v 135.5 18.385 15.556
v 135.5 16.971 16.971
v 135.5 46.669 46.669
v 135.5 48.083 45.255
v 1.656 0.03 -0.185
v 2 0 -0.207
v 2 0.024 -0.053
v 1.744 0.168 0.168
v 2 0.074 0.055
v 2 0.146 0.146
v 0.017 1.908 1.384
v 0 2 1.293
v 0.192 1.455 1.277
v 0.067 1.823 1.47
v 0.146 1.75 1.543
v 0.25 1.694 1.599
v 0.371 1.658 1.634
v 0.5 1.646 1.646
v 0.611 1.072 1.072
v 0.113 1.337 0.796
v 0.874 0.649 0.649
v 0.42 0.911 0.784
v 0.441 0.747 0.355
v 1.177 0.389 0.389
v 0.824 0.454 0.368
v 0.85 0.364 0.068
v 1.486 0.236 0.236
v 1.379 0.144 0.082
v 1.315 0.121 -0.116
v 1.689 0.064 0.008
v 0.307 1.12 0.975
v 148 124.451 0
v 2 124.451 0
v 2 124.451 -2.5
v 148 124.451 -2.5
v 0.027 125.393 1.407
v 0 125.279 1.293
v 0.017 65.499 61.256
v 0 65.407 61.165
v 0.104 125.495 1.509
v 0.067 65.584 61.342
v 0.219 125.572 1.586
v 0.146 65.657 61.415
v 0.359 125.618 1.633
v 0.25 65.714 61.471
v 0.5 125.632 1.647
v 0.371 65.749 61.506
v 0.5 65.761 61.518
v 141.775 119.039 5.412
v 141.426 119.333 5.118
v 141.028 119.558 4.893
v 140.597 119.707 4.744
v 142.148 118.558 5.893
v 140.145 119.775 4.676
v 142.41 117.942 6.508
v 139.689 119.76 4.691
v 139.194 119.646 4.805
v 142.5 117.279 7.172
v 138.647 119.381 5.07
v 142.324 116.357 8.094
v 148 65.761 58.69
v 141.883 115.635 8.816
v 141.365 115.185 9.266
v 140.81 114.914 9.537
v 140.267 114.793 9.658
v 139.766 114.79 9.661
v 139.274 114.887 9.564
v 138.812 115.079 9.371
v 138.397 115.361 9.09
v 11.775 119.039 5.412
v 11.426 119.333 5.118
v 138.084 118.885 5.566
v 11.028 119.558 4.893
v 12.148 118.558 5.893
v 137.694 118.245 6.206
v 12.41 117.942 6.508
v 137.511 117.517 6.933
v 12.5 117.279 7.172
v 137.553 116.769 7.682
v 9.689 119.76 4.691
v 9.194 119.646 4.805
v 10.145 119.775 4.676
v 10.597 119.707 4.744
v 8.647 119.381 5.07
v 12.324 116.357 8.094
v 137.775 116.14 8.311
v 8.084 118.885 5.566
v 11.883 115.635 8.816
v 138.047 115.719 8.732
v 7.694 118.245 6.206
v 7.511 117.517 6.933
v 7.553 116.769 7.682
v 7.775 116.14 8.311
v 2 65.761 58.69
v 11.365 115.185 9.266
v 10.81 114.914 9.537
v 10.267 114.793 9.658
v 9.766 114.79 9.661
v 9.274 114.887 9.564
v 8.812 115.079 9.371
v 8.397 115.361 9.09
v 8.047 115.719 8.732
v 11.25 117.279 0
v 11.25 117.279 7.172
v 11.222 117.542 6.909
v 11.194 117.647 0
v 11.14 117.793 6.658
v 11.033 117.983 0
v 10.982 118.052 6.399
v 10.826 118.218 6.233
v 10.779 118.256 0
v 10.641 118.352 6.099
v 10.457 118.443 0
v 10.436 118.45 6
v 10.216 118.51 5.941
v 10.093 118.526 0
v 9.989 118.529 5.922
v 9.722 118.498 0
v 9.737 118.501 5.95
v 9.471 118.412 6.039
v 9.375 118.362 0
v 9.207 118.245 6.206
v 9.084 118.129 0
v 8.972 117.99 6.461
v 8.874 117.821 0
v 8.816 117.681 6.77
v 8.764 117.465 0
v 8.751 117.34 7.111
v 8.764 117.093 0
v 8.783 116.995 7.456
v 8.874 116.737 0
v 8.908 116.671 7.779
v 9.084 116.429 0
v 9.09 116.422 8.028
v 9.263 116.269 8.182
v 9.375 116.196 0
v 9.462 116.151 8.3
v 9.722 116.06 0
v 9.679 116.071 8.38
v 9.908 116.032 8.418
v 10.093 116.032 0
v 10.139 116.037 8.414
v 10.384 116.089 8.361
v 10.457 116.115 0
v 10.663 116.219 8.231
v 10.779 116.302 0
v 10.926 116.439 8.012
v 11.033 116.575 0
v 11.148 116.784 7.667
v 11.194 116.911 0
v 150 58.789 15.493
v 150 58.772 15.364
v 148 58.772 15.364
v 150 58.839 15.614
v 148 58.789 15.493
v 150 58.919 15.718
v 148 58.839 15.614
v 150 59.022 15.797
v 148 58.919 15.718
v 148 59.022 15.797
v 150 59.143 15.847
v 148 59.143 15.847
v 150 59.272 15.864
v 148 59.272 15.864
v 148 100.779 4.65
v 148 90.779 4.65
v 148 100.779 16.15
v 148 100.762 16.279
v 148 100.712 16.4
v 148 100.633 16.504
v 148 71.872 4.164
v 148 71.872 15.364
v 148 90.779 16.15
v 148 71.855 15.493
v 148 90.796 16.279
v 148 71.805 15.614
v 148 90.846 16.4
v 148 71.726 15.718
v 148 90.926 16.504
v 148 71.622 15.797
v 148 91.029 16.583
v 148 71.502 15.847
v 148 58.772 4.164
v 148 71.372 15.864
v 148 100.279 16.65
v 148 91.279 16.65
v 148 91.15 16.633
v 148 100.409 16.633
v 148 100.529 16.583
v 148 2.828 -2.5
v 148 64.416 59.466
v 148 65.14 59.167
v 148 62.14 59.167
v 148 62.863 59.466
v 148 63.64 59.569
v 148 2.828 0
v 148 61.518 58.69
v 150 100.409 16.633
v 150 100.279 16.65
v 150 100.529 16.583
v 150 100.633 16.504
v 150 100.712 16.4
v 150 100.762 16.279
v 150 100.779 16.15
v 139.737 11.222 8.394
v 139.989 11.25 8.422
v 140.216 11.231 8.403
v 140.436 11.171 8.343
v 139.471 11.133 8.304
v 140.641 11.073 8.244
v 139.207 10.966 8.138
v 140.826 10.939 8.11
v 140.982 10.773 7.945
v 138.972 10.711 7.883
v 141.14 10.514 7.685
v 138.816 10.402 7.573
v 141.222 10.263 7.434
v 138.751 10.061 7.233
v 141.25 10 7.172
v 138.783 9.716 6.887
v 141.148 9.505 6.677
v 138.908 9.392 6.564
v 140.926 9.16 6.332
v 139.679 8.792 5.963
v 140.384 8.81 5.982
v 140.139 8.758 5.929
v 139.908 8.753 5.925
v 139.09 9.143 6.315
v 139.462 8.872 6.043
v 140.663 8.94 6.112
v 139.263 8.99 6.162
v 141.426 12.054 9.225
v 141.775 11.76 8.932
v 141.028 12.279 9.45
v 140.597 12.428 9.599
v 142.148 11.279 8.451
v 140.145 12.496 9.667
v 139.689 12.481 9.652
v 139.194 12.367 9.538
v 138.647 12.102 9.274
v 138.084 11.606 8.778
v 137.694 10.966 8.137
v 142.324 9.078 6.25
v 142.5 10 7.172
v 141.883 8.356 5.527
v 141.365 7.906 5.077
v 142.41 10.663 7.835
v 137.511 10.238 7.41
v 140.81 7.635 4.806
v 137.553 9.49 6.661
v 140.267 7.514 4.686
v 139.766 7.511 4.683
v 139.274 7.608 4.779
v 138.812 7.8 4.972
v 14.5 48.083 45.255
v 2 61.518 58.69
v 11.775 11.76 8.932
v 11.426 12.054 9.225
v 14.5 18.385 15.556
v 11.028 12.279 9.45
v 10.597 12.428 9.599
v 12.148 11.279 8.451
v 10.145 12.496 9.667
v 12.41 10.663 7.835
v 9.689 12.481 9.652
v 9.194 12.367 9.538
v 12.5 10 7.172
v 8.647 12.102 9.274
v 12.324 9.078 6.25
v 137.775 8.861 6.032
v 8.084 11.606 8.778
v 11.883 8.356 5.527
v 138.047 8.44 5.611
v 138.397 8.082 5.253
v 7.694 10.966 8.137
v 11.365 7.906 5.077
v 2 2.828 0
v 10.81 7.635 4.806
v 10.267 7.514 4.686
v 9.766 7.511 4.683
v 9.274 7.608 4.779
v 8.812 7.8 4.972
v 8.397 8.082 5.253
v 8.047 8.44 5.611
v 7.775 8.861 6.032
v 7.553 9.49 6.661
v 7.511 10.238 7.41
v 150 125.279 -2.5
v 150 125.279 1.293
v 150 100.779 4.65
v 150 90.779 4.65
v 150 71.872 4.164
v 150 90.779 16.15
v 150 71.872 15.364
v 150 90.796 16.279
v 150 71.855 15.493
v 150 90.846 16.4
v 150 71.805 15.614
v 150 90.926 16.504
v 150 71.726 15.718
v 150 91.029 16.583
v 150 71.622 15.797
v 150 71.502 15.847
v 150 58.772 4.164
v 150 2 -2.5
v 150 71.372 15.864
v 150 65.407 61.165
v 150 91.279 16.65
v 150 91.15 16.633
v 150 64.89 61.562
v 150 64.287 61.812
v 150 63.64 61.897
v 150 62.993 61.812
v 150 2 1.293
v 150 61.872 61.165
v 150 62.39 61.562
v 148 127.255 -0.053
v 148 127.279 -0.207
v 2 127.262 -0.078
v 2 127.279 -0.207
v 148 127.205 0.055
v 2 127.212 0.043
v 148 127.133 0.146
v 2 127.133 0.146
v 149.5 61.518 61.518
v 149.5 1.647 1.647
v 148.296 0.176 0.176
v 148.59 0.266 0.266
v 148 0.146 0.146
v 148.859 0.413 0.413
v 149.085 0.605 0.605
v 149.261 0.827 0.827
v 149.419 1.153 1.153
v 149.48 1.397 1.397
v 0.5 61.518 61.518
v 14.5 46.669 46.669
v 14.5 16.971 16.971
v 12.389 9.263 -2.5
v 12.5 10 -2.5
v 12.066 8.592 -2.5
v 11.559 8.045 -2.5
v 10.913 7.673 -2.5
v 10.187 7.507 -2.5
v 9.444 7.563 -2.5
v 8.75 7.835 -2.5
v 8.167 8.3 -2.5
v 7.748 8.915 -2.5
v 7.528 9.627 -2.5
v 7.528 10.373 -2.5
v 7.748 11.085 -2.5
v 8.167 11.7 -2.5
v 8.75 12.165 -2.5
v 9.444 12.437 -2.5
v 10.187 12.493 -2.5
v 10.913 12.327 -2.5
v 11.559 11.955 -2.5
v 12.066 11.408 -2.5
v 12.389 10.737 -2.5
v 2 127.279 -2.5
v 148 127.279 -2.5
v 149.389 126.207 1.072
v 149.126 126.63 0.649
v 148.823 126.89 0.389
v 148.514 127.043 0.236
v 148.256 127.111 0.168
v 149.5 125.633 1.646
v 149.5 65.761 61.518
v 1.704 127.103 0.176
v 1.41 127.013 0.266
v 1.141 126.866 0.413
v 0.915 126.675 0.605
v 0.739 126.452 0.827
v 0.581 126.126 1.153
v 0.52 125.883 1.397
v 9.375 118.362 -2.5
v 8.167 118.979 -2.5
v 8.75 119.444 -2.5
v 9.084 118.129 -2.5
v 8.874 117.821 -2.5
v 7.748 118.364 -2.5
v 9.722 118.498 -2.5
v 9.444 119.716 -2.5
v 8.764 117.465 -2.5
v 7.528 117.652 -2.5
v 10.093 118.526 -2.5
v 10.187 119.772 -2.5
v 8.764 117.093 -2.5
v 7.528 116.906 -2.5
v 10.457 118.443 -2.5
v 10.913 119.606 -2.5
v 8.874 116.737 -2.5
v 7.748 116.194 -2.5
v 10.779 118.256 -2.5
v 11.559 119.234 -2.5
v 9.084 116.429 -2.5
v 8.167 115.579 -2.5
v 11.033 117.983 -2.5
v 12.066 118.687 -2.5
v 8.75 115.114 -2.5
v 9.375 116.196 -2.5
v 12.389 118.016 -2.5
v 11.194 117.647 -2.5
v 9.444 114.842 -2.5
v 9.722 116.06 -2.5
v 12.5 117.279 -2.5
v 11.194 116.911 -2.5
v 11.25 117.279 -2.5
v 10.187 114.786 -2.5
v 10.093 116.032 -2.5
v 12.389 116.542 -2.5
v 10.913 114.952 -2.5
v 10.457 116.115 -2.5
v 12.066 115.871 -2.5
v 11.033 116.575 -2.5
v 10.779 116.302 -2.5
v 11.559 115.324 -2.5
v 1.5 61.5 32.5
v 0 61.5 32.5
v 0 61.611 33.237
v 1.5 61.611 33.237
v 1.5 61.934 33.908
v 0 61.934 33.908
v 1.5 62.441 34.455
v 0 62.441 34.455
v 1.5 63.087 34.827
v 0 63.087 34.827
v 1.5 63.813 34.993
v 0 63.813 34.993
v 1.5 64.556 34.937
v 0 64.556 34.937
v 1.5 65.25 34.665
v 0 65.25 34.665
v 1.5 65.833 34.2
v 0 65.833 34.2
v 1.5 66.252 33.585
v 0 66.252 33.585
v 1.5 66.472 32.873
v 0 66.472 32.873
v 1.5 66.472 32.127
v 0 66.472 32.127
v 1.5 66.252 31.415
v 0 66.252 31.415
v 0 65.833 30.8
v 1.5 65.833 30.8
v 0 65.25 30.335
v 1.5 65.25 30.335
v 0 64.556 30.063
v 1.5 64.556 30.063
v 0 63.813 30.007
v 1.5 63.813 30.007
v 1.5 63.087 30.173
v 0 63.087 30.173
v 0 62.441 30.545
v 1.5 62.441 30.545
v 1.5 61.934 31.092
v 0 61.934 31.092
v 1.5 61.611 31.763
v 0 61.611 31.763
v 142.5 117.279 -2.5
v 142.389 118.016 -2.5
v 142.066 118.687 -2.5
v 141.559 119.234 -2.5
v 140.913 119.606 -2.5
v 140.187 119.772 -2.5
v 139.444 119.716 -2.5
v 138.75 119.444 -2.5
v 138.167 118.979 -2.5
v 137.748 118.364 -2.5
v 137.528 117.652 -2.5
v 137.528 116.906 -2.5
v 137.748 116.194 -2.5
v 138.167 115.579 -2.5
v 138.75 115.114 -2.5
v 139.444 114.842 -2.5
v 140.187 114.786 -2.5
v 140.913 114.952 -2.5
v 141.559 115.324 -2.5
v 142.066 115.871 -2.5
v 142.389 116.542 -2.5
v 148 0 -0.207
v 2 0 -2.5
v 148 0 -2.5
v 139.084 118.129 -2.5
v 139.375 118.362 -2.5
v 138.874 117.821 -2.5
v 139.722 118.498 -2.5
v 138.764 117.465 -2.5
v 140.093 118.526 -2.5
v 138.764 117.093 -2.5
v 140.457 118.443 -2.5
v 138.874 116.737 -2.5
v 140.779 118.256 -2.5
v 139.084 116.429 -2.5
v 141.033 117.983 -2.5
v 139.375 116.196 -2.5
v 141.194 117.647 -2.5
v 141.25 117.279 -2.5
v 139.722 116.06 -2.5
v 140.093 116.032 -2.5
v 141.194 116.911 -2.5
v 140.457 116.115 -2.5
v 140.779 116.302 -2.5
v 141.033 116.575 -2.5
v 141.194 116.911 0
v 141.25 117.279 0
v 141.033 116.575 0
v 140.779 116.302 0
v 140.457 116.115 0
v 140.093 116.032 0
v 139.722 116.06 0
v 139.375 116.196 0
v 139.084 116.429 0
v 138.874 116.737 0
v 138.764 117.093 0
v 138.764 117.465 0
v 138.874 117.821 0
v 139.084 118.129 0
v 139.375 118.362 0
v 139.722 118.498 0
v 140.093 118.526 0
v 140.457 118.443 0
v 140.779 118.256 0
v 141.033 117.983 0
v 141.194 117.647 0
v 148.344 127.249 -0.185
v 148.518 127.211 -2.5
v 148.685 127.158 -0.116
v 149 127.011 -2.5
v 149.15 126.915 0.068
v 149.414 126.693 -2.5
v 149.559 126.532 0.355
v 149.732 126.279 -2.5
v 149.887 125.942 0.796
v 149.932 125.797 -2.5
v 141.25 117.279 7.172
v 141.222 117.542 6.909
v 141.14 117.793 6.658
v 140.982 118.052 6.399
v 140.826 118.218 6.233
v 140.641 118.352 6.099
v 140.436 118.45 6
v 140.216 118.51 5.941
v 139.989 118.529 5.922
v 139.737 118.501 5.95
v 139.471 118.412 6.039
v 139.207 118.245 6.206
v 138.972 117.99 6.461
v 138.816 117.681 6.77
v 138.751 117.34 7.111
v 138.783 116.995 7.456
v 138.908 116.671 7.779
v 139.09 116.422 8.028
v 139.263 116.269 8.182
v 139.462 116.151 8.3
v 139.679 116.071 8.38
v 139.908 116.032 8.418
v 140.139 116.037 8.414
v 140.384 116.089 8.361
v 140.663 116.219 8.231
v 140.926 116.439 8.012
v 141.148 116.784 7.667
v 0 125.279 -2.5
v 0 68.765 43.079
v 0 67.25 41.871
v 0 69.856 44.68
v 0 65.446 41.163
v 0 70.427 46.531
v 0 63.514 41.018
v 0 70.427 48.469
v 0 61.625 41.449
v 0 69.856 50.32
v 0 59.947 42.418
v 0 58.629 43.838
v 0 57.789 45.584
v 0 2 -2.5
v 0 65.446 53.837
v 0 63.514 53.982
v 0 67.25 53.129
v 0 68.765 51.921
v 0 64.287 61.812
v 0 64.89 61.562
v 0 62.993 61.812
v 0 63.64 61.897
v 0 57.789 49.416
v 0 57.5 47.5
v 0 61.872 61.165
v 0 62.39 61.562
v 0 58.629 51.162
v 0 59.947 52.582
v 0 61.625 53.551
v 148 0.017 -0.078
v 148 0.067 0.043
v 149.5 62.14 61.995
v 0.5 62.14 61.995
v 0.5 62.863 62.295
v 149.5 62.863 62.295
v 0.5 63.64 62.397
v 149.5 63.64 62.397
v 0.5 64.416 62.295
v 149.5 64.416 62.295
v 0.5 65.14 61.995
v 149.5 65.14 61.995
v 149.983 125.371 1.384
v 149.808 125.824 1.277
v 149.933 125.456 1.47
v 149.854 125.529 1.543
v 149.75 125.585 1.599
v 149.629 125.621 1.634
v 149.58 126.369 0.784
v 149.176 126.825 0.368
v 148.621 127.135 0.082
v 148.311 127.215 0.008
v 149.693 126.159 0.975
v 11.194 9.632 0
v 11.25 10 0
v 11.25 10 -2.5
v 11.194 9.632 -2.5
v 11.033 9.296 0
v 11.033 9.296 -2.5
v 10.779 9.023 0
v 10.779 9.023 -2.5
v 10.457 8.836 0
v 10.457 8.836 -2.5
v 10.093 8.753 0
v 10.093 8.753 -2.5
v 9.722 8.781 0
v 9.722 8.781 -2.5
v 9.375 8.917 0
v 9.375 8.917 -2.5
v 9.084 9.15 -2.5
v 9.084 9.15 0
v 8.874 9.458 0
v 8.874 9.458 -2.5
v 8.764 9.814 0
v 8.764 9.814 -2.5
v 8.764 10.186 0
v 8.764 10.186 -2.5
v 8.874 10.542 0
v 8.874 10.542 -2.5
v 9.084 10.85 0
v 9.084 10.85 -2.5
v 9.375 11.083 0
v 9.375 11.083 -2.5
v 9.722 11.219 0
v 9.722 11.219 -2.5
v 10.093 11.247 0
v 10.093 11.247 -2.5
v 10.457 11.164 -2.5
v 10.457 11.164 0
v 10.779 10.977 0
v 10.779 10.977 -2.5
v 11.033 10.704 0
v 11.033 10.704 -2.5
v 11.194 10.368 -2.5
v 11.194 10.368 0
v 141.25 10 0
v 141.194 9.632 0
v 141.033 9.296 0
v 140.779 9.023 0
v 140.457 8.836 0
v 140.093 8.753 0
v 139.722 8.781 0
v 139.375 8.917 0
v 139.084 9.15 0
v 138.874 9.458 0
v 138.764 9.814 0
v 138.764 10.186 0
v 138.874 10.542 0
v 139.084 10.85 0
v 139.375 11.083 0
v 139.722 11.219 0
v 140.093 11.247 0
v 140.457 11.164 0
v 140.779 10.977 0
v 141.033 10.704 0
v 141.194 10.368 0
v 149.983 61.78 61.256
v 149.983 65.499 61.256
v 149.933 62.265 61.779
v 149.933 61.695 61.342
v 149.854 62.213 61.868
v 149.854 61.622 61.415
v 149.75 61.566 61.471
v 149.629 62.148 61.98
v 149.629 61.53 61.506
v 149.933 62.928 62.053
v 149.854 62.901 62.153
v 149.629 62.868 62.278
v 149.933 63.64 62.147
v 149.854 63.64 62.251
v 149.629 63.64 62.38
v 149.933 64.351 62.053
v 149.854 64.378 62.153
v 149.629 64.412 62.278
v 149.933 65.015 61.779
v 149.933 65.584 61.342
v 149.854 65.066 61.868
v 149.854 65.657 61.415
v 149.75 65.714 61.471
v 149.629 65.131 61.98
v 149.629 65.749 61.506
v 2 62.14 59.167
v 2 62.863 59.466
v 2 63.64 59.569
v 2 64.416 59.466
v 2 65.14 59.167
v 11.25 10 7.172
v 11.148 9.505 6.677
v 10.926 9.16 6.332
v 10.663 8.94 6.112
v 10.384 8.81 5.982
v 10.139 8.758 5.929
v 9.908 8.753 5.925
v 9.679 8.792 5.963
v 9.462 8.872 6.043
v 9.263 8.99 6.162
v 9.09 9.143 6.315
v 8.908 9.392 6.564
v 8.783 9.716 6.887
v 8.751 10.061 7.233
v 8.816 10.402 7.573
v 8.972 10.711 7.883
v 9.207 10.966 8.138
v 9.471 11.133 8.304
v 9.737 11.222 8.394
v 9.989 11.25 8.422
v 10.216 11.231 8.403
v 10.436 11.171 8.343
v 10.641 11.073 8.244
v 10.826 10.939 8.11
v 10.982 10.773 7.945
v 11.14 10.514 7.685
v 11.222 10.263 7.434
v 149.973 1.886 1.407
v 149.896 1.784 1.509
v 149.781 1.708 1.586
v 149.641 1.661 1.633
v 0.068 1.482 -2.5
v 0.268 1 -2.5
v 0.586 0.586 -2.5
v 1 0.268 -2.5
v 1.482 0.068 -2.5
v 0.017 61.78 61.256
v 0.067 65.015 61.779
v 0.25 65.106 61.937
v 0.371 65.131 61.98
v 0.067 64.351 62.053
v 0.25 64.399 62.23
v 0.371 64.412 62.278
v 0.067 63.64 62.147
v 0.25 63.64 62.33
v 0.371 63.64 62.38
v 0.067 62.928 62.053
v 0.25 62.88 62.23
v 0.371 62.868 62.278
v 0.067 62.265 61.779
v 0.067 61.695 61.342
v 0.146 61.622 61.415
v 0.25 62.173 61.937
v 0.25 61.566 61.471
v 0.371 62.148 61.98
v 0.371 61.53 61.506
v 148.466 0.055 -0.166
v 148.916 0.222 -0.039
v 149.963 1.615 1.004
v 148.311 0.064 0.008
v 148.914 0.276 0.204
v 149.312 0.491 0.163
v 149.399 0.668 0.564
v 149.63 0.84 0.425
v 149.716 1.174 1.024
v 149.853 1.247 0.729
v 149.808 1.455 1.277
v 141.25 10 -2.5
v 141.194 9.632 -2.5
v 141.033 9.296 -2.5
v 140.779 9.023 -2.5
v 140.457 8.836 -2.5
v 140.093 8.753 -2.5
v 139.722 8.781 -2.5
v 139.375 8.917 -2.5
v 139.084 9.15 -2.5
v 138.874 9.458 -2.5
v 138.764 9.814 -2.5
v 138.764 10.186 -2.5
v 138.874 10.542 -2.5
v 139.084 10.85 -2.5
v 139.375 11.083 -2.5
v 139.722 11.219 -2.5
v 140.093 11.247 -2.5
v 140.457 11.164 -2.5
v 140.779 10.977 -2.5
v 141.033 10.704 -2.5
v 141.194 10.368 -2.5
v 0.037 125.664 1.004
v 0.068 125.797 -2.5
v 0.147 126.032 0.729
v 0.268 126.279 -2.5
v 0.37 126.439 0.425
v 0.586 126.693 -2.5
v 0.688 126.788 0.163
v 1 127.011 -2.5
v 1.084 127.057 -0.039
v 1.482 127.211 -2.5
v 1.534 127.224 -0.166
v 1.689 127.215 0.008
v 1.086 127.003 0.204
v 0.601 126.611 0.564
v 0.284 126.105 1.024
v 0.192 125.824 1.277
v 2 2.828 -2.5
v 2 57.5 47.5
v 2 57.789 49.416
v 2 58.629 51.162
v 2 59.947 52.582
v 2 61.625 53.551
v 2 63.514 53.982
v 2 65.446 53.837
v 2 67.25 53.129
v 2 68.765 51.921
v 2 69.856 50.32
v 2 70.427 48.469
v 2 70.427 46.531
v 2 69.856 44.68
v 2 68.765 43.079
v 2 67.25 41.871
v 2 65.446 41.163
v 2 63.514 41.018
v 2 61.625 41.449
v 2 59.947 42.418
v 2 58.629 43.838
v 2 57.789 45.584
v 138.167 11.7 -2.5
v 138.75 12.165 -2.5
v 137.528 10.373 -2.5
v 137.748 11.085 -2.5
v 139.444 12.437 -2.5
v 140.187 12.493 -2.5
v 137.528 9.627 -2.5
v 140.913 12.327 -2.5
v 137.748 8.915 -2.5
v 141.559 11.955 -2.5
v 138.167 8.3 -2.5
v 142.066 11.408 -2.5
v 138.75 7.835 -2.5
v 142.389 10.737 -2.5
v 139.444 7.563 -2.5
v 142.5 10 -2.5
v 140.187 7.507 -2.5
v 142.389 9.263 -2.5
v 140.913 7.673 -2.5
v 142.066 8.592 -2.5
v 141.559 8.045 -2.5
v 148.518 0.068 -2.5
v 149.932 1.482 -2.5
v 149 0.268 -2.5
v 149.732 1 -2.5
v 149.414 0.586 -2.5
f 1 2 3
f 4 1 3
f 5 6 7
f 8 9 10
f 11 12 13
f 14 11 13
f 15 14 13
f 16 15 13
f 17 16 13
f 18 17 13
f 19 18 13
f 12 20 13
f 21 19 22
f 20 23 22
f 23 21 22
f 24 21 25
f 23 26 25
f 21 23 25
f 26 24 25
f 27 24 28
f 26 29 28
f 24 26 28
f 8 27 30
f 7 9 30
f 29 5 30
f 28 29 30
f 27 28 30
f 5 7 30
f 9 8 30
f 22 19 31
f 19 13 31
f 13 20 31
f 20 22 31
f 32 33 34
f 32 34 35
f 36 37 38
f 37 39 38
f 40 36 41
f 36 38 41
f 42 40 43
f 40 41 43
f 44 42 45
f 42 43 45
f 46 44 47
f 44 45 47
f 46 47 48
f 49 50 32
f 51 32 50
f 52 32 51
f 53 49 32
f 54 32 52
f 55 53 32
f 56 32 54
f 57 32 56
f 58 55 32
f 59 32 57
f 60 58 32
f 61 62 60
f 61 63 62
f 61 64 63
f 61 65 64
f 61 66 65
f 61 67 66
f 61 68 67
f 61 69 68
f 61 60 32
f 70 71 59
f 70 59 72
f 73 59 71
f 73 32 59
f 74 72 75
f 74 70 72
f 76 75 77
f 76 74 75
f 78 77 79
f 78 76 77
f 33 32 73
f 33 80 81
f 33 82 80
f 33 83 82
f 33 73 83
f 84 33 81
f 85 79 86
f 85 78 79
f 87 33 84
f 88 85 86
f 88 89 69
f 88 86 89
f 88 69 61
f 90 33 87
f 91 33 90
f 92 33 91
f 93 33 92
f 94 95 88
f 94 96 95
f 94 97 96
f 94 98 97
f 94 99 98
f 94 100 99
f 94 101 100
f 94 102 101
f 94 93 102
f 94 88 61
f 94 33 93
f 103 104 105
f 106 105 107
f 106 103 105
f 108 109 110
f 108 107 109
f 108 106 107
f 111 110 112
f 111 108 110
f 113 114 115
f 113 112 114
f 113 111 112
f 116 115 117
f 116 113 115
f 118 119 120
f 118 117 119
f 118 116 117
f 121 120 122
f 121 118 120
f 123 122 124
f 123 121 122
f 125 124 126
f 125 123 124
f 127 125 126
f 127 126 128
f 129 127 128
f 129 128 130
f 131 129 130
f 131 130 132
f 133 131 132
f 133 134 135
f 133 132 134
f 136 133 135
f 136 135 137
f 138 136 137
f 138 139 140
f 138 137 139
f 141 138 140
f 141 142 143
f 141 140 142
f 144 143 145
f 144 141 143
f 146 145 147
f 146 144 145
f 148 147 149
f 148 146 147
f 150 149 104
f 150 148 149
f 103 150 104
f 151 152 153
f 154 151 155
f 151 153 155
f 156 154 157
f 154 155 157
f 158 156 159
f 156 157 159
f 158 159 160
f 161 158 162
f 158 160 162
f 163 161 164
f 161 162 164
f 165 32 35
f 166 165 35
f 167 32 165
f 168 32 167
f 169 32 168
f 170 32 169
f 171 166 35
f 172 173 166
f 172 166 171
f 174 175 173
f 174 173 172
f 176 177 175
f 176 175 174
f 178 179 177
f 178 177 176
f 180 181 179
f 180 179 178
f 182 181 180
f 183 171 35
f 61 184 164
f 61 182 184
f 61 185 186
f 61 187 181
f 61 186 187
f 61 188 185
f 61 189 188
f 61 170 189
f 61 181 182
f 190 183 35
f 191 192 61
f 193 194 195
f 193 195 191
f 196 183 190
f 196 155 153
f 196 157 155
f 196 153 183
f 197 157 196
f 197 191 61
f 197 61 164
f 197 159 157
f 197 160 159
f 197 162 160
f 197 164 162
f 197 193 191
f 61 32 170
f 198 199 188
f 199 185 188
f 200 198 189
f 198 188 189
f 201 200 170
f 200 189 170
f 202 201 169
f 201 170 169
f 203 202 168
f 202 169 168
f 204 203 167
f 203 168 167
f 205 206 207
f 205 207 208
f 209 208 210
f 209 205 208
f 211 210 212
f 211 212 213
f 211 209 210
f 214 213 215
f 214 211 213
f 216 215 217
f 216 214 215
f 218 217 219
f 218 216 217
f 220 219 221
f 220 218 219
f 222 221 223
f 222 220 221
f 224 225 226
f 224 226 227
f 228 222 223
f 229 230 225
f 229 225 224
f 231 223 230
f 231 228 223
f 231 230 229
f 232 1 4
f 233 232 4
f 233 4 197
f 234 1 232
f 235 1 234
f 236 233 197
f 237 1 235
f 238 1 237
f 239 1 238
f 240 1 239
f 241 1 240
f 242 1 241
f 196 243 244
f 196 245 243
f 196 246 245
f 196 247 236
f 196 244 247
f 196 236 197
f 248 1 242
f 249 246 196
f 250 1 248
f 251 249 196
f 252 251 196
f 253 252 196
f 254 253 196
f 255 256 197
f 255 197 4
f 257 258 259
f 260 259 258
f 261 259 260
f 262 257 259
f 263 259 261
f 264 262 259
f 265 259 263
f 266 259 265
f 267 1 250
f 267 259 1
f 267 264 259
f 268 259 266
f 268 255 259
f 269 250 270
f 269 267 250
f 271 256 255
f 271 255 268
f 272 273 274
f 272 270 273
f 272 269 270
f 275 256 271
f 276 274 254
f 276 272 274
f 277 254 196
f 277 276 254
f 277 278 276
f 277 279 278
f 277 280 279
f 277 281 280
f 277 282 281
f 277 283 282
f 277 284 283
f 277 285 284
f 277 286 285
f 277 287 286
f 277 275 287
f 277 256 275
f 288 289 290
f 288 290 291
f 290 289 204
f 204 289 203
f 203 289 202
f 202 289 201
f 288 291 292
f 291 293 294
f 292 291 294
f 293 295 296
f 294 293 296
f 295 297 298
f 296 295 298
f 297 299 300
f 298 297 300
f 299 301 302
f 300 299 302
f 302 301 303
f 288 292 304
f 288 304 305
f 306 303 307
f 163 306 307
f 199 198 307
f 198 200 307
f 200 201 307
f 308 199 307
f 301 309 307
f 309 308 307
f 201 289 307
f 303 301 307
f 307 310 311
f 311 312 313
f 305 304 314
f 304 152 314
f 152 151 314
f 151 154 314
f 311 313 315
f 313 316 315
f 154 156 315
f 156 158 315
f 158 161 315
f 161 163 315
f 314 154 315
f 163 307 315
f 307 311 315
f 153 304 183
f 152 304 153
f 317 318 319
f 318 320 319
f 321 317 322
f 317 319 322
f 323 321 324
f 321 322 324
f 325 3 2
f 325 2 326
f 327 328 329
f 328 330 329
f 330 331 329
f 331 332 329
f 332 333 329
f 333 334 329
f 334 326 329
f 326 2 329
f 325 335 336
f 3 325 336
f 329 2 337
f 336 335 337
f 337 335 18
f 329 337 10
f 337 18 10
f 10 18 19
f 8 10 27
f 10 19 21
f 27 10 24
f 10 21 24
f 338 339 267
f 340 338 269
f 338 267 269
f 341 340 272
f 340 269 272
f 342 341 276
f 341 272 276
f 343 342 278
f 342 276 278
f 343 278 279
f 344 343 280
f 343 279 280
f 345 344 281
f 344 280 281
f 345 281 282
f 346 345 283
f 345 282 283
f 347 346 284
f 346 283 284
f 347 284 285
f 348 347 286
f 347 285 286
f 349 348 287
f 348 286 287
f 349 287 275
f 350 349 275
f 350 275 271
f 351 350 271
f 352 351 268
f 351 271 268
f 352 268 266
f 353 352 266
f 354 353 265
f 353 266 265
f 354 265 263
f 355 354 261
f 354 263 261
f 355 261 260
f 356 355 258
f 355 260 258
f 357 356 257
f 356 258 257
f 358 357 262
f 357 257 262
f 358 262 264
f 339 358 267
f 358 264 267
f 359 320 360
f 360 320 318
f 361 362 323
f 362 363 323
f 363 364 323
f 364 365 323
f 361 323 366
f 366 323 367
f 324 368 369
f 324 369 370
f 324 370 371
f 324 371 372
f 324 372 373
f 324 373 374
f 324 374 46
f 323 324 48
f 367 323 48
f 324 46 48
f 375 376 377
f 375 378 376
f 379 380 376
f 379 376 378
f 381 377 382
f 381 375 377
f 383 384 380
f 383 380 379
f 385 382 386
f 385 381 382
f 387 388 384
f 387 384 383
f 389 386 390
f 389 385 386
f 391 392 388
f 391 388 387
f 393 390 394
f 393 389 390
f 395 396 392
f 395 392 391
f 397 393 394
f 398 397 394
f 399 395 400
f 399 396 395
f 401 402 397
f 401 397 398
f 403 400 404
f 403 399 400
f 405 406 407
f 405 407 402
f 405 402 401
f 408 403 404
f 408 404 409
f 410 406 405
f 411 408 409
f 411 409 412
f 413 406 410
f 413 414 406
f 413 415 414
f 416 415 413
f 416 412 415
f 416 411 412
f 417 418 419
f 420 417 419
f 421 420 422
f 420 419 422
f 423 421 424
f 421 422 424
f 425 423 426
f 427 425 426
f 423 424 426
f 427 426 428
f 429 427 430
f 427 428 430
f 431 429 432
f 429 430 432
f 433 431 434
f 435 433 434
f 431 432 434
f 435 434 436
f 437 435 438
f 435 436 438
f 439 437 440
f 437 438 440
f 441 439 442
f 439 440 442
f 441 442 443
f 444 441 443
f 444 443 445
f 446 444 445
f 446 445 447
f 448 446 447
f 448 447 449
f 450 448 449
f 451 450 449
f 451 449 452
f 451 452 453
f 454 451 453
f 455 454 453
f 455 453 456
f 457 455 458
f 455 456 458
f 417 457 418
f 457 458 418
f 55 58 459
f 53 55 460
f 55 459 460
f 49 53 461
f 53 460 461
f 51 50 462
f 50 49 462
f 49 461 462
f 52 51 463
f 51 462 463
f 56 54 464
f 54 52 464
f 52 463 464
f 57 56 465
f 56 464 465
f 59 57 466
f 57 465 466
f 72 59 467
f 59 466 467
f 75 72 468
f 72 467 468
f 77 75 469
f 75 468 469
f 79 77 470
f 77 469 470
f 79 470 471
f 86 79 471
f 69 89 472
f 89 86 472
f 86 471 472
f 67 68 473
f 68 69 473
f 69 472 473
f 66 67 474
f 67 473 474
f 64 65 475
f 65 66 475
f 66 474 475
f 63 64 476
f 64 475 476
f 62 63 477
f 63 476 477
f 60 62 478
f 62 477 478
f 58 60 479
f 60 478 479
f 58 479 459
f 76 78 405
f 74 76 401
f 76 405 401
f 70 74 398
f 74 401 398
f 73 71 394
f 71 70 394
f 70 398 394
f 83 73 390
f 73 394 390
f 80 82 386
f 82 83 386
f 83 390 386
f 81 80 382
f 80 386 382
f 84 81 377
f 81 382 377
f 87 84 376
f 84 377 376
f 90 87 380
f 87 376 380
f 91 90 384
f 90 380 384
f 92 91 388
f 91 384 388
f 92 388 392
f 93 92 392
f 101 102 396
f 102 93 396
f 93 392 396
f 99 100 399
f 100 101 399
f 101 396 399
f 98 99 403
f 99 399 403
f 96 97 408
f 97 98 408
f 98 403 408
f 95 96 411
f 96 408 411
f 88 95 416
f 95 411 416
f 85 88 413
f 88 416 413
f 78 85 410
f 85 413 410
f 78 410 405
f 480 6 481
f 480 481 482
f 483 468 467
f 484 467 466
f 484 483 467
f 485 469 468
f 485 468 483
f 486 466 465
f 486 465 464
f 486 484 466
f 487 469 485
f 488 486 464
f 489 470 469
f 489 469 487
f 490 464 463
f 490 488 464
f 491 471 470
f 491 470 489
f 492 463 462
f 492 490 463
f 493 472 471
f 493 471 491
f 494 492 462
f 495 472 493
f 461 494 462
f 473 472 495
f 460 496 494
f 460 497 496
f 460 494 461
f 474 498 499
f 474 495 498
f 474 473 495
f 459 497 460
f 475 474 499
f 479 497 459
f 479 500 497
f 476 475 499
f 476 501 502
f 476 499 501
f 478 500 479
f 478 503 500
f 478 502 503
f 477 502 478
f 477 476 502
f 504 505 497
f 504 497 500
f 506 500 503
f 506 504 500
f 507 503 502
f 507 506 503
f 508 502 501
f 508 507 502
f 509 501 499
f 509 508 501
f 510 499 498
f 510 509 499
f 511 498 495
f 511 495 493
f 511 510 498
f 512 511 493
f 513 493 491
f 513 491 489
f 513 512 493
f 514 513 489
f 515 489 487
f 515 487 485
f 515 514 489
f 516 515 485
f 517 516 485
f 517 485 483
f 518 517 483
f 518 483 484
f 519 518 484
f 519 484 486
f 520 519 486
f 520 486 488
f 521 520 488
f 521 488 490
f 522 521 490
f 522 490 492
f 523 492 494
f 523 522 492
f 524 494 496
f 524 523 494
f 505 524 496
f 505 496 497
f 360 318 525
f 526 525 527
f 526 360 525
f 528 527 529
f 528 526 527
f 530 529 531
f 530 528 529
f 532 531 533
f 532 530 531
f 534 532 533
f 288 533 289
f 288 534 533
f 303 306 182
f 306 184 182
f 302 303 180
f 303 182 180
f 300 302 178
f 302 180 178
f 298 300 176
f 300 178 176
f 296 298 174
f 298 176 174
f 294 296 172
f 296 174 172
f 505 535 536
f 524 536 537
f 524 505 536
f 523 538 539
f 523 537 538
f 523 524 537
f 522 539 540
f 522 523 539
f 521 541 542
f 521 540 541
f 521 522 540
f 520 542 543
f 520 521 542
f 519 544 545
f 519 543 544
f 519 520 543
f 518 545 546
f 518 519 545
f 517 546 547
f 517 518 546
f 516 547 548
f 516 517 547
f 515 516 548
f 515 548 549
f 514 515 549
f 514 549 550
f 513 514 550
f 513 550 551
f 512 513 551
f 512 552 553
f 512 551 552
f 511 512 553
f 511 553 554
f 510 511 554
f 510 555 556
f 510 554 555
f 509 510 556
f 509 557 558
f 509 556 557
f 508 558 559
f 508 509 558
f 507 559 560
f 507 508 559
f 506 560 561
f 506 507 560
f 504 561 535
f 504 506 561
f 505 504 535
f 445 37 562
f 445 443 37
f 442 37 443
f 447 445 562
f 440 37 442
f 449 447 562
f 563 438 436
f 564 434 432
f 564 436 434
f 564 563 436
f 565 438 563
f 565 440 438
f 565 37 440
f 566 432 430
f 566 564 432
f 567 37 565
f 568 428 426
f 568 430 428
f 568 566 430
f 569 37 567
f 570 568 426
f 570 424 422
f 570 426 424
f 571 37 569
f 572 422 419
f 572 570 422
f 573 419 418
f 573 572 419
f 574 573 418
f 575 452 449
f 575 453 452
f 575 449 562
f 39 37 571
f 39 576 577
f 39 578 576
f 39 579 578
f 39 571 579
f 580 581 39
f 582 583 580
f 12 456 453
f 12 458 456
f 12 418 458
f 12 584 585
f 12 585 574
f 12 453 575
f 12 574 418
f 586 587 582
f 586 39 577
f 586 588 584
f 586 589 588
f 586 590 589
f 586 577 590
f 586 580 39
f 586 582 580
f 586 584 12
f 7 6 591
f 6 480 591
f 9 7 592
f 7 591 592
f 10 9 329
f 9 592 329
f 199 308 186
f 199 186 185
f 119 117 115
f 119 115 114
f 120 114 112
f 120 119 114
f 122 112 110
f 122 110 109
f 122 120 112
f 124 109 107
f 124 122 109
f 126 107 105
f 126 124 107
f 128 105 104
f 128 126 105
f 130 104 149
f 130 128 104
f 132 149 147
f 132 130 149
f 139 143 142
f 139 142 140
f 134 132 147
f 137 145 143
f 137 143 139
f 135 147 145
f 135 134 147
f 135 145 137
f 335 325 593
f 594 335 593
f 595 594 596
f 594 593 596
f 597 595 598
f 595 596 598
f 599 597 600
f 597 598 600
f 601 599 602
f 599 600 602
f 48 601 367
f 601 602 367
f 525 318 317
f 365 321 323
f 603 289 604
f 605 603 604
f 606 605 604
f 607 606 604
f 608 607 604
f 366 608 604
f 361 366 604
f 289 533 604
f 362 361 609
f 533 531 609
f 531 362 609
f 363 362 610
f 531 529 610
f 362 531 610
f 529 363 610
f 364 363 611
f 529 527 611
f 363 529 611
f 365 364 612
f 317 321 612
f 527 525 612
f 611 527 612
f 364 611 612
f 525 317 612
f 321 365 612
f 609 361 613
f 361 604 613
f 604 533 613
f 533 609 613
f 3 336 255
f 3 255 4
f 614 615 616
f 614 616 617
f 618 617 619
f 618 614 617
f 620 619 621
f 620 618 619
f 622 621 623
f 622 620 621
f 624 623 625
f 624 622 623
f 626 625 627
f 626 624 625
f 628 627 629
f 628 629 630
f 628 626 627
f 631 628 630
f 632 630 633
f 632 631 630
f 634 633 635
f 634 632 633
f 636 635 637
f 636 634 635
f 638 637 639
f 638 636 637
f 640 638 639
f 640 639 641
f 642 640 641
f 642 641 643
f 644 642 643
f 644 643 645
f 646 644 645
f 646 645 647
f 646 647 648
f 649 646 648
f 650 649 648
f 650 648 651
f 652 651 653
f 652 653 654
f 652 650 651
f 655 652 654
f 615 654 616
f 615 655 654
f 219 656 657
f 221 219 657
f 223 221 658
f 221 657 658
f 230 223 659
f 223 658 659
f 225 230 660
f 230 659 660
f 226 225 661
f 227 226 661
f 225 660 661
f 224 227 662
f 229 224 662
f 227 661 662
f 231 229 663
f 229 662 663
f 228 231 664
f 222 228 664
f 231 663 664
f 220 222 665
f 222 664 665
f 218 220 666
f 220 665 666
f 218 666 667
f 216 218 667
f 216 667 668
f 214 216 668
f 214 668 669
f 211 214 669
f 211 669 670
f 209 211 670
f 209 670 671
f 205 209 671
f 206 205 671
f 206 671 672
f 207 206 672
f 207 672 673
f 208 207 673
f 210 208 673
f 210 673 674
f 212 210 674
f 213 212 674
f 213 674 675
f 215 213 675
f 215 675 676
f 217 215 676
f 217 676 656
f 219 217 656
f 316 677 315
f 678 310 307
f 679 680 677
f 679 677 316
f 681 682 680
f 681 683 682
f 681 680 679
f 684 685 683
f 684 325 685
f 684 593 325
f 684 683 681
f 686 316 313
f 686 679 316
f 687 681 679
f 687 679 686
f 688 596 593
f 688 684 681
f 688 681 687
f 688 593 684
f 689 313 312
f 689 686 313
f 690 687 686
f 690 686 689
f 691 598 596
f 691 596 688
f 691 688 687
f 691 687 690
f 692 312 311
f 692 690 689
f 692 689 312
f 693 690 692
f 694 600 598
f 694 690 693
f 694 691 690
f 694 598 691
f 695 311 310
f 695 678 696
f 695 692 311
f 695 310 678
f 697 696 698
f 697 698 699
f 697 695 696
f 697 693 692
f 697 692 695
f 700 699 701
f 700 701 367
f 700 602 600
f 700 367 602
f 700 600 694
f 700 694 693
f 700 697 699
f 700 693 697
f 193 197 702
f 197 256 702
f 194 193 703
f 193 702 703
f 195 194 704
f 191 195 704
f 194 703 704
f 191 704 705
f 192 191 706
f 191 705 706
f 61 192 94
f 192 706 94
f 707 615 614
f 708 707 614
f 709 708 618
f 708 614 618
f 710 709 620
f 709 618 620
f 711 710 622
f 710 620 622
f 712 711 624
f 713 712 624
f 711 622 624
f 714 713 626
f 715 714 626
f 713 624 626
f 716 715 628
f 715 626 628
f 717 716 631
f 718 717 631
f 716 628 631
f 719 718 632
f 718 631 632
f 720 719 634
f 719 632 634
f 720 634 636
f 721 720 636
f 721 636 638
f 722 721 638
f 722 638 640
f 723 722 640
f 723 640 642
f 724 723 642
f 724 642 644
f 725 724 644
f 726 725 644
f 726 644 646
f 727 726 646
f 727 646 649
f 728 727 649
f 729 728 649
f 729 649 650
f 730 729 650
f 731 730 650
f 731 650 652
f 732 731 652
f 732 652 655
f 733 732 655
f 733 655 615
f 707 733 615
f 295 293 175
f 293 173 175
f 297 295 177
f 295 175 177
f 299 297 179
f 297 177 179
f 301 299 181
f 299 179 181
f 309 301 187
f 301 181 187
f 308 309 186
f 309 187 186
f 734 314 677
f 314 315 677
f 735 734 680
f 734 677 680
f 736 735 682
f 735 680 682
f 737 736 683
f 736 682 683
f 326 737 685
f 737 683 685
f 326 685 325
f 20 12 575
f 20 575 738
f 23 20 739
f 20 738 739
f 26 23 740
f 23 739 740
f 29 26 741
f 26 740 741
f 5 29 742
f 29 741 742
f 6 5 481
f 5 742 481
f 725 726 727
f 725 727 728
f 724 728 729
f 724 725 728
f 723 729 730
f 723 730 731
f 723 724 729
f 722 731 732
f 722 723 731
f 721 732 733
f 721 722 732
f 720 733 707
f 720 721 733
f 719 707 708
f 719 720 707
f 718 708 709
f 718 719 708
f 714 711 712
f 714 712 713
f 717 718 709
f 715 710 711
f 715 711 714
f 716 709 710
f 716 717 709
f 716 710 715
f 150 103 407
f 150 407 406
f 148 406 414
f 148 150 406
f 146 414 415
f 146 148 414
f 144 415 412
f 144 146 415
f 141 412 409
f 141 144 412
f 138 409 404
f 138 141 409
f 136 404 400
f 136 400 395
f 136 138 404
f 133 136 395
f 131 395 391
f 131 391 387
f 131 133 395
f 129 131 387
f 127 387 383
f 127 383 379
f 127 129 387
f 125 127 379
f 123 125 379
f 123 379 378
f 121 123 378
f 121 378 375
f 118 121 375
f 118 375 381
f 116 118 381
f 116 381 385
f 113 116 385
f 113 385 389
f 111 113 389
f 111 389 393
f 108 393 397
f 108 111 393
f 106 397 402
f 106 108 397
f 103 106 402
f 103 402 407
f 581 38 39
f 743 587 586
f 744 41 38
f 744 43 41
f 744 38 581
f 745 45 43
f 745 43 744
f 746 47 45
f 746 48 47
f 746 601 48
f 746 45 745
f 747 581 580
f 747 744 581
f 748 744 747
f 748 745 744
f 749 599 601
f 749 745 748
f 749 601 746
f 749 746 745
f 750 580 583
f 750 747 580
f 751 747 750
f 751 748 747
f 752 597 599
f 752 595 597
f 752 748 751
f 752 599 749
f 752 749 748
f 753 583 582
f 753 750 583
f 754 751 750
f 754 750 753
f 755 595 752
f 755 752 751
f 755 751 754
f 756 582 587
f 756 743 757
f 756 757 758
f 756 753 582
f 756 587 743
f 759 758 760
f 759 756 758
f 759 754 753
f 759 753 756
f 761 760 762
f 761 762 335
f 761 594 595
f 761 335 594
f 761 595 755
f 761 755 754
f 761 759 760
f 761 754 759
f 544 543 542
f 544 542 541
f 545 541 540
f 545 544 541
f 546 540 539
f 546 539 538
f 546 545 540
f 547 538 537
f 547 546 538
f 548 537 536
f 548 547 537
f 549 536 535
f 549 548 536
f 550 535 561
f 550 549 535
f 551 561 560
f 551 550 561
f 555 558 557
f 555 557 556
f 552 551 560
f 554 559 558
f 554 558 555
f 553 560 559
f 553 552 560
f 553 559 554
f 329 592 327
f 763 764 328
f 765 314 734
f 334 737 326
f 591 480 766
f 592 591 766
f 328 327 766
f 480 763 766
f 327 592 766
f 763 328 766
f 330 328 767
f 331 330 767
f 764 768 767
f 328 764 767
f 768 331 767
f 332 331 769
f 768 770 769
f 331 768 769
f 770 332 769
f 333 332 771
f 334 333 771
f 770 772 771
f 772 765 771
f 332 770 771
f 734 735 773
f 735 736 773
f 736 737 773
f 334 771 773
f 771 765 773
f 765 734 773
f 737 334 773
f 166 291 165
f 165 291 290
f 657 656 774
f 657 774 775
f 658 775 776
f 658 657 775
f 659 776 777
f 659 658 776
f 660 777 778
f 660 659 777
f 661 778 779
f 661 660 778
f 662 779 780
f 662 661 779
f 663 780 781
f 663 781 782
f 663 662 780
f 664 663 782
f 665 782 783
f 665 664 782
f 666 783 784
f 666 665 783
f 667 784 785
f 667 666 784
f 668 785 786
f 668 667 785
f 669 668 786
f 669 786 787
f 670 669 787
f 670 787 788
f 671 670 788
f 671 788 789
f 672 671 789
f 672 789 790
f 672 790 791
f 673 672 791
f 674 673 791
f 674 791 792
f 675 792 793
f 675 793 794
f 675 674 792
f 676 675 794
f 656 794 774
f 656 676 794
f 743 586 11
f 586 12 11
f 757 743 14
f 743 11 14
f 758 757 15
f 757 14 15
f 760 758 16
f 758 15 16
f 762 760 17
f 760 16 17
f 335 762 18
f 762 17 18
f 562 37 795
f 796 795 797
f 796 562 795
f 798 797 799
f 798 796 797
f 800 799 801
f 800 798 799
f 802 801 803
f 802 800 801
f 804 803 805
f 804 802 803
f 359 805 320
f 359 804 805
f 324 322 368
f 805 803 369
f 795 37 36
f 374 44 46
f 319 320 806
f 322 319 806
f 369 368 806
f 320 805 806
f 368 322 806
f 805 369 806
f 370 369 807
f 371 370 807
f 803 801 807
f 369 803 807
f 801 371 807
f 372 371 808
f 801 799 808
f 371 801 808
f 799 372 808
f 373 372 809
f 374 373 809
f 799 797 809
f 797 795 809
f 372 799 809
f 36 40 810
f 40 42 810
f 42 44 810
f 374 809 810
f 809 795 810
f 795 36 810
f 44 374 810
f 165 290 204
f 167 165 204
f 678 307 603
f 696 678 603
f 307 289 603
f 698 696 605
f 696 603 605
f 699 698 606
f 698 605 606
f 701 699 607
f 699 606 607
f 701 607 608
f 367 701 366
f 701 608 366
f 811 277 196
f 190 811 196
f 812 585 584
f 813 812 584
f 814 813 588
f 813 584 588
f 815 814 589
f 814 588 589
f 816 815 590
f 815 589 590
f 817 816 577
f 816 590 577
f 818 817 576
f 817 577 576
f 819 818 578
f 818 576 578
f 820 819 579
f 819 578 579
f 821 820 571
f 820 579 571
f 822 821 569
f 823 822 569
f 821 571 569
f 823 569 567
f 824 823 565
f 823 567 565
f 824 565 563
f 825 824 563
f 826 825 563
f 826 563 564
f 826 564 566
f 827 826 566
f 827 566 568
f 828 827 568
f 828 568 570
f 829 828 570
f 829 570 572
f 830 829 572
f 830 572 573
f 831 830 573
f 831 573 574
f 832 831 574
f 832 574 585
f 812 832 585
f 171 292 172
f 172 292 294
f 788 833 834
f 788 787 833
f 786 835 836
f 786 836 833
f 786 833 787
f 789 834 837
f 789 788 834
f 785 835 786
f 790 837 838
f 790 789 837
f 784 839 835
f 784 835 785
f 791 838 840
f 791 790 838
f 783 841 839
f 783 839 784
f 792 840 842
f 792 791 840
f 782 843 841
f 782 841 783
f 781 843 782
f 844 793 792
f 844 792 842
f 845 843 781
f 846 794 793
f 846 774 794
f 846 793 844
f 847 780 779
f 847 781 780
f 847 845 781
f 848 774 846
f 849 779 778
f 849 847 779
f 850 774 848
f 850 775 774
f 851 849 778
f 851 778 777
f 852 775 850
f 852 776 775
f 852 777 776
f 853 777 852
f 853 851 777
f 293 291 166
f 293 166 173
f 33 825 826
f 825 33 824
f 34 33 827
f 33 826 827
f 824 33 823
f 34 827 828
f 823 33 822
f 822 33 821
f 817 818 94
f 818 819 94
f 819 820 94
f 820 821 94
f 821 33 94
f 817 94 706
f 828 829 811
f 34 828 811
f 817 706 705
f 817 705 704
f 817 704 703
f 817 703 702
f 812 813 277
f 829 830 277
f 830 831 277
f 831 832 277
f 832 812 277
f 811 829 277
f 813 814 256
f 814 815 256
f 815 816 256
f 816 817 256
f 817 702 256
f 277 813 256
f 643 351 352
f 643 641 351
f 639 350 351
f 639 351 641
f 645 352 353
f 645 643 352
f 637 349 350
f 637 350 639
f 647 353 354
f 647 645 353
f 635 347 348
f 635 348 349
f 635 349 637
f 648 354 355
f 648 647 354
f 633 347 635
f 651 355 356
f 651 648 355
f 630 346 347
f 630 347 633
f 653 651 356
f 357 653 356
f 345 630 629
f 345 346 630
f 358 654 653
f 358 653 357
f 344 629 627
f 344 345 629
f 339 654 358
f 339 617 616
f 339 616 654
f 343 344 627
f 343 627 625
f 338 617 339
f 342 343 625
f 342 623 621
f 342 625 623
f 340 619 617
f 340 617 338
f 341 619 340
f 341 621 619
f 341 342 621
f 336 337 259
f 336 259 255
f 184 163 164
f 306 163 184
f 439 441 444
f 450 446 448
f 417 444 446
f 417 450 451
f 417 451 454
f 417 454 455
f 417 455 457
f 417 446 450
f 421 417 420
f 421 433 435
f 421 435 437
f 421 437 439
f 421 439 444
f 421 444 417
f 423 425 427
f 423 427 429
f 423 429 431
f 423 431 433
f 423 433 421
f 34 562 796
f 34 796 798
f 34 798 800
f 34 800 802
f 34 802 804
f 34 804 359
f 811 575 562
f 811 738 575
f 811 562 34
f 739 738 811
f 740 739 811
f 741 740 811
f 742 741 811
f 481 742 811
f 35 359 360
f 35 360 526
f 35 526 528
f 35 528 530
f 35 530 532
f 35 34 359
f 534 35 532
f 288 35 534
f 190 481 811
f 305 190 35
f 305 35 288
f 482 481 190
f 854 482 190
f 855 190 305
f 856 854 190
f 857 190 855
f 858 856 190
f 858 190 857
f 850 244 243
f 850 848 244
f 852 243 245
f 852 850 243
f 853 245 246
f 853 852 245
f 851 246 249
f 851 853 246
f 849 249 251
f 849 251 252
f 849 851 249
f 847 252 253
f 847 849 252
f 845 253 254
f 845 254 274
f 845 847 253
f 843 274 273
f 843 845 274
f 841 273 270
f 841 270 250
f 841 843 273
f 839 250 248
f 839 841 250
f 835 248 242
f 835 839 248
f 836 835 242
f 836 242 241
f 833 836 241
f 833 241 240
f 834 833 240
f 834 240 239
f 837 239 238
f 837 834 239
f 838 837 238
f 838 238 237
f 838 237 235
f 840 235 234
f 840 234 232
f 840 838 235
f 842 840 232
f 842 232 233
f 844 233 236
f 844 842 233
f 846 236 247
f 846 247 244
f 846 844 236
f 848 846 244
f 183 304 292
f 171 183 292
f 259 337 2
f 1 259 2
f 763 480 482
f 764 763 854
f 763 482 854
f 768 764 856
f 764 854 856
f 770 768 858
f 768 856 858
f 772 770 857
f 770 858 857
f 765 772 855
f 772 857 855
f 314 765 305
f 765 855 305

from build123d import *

# Parameters (mm, degrees)
F1_DEPTH  = 150
F2_T      = -2
F4_W      = 121
F4_H      = 42
F5_DEPTH  = 3
F6_R      = 3
F8_R      = 2.5
F8_R_2    = 1.5
F10_R     = 2.5
F10_R_2   = 1.25
F11_REACH = 69.4690374315
F12_W     = 150
F12_H     = 127.2792206136
F12_W_2   = 146
F12_H_2   = 121.6223663641
F13_DEPTH = 2.5
F14_R     = 2.5
F14_R_2   = 1.25
F16_R     = 2
F17_R     = 0.5
F7_W      = 10
F7_H      = 12
F7_W_2    = 13.1
F7_H_2    = 11.7
F18_DEPTH = 3
F19_R     = 0.5
F20_R     = 0.5
F21_R     = 6.5
F22_DEPTH = 2.5
F23_R     = 2.5
F23_R_2   = 1.25
F24_DEPTH = 2.5
F25_R     = 2.5
F26_DEPTH = 1.5
F27_R     = 3


with BuildPart() as f1:
    # F0 (on Right) → F1 (new body)
    with BuildSketch(Plane.YZ):
        Polygon((63.6396103068, 63.6396103068), (0, 0), (127.2792206136, 0), align=None)
    extrude(amount=F1_DEPTH)

    # F2
    f2_openings = [f1.faces().sort_by_distance(p)[0] for p in [
        (75, 63.63961, 0),
    ]]
    offset(amount=F2_T, openings=f2_openings)

    # F4 (on offset) → F5 (cut)
    with BuildSketch(Plane(origin=(0, 0, 0), x_dir=(1, 0, 0), z_dir=(0, -0.7071067812, 0.7071067812))):
        with Locations((75, 45)):
            Rectangle(F4_W, F4_H)
    extrude(amount=-F5_DEPTH, mode=Mode.SUBTRACT)

    # F6
    f6_edges = [f1.edges().sort_by_distance(p)[0] for p in [
        (75, 63.63961, 63.63961),
    ]]
    fillet(f6_edges, radius=F6_R)

    # F8 (on face) → F9 (join, up to the last surface of F1)
    with BuildSketch(Plane(origin=(0, 0, 0), x_dir=(1, 0, 0), z_dir=(0, 0, -1))):
        with Locations((10, -10)):
            Circle(F8_R)
        with Locations((10, -10)):
            Circle(F8_R_2, mode=Mode.SUBTRACT)
    extrude(until=Until.LAST, dir=(0, 0, 1))

    f11_end = Plane(origin=(75.2423938978, 33.320661552, 30.4922344273), x_dir=(0, 0.7071067812, 0.7071067812), z_dir=(0, 0.7071067812, -0.7071067812))
    # F10 (on face) → F11 (join, up to a plane its end follows)
    with BuildSketch(Plane(origin=(0, 0, 0), x_dir=(1, 0, 0), z_dir=(0, 0, -1))):
        with Locations((10, -10)):
            Circle(F10_R)
        with Locations((10, -10)):
            Circle(F10_R_2, mode=Mode.SUBTRACT)
        with Locations((140, -10)):
            Circle(F10_R)
        with Locations((140, -10)):
            Circle(F10_R_2, mode=Mode.SUBTRACT)
    f11_long = extrude(amount=-F11_REACH, mode=Mode.PRIVATE)
    add(split(f11_long, bisect_by=f11_end, keep=Keep.TOP, mode=Mode.PRIVATE))

    # F12 (on face) → F13 (join)
    with BuildSketch(Plane(origin=(0, 0, 0), x_dir=(1, 0, 0), z_dir=(0, 0, -1))):
        with Locations((75, -63.6396103068)):
            Rectangle(F12_W, F12_H)
        with Locations((75, -63.6396103068)):
            Rectangle(F12_W_2, F12_H_2, mode=Mode.SUBTRACT)
    extrude(amount=F13_DEPTH)

    # F14 (on Top) → F15 (join, up to the next surface of F1)
    with BuildSketch(Plane.XY):
        with Locations((140, 117.279)):
            Circle(F14_R)
        with Locations((140, 117.279)):
            Circle(F14_R_2, mode=Mode.SUBTRACT)
        with Locations((10, 117.279)):
            Circle(F14_R)
        with Locations((10, 117.279)):
            Circle(F14_R_2, mode=Mode.SUBTRACT)
    extrude(until=Until.NEXT)

    # F16
    f16_edges = [f1.edges().sort_by_distance(p)[0] for p in [
        (150, 127.279221, -1.25),
        (150, 0, -1.25),
        (0, 0, -1.25),
        (0, 127.279221, -1.25),
    ]]
    fillet(f16_edges, radius=F16_R)

    # F17
    f17_edges = [f1.edges().sort_by_distance(p)[0] for p in [
        (0, 31.759145, 31.759145),
    ]]
    fillet(f17_edges, radius=F17_R)

    # F7 (on face) → F18 (cut)
    with BuildSketch(Plane.YZ.offset(150)):
        with Locations((95.7792206136, 10.65)):
            Rectangle(F7_W, F7_H)
        with Locations((65.3223664939, 10.0139604606)):
            Rectangle(F7_W_2, F7_H_2)
    extrude(amount=-F18_DEPTH, mode=Mode.SUBTRACT)

    # F19
    f19_edges = [f1.edges().sort_by_distance(p)[0] for p in [
        (149, 90.779221, 16.65),
        (149, 100.779221, 16.65),
    ]]
    fillet(f19_edges, radius=F19_R)

    # F20
    f20_edges = [f1.edges().sort_by_distance(p)[0] for p in [
        (149, 71.872366, 15.86396),
        (149, 58.772366, 15.86396),
    ]]
    fillet(f20_edges, radius=F20_R)

    # F21 (on face) → F22 (cut)
    with BuildSketch(Plane(origin=(0, 0, 0), x_dir=(0, -1, 0), z_dir=(-1, 0, 0))):
        with Locations((-64, 47.5)):
            Circle(F21_R)
    extrude(amount=-F22_DEPTH, mode=Mode.SUBTRACT)

    # F23 (on face) → F24 (join)
    with BuildSketch(Plane(origin=(0, 0, 0), x_dir=(1, 0, 0), z_dir=(0, 0, -1))):
        with Locations((10, -10)):
            Circle(F23_R)
        with Locations((10, -10)):
            Circle(F23_R_2, mode=Mode.SUBTRACT)
        with Locations((140, -10)):
            Circle(F23_R)
        with Locations((140, -10)):
            Circle(F23_R_2, mode=Mode.SUBTRACT)
        with Locations((10, -117.279)):
            Circle(F23_R)
        with Locations((10, -117.279)):
            Circle(F23_R_2, mode=Mode.SUBTRACT)
        with Locations((140, -117.279)):
            Circle(F23_R)
        with Locations((140, -117.279)):
            Circle(F23_R_2, mode=Mode.SUBTRACT)
    extrude(amount=F24_DEPTH)

    # F25 (on face) → F26 (cut)
    with BuildSketch(Plane(origin=(0, 0, 0), x_dir=(0, -1, 0), z_dir=(-1, 0, 0))):
        with Locations((-64, 32.5)):
            Circle(F25_R)
    extrude(amount=-F26_DEPTH, mode=Mode.SUBTRACT)

    # F27
    f27_edges = [f1.edges().sort_by_distance(p)[0] for p in [
        (75, 63.63961, 60.811183),
    ]]
    fillet(f27_edges, radius=F27_R)


solid = f1.part
